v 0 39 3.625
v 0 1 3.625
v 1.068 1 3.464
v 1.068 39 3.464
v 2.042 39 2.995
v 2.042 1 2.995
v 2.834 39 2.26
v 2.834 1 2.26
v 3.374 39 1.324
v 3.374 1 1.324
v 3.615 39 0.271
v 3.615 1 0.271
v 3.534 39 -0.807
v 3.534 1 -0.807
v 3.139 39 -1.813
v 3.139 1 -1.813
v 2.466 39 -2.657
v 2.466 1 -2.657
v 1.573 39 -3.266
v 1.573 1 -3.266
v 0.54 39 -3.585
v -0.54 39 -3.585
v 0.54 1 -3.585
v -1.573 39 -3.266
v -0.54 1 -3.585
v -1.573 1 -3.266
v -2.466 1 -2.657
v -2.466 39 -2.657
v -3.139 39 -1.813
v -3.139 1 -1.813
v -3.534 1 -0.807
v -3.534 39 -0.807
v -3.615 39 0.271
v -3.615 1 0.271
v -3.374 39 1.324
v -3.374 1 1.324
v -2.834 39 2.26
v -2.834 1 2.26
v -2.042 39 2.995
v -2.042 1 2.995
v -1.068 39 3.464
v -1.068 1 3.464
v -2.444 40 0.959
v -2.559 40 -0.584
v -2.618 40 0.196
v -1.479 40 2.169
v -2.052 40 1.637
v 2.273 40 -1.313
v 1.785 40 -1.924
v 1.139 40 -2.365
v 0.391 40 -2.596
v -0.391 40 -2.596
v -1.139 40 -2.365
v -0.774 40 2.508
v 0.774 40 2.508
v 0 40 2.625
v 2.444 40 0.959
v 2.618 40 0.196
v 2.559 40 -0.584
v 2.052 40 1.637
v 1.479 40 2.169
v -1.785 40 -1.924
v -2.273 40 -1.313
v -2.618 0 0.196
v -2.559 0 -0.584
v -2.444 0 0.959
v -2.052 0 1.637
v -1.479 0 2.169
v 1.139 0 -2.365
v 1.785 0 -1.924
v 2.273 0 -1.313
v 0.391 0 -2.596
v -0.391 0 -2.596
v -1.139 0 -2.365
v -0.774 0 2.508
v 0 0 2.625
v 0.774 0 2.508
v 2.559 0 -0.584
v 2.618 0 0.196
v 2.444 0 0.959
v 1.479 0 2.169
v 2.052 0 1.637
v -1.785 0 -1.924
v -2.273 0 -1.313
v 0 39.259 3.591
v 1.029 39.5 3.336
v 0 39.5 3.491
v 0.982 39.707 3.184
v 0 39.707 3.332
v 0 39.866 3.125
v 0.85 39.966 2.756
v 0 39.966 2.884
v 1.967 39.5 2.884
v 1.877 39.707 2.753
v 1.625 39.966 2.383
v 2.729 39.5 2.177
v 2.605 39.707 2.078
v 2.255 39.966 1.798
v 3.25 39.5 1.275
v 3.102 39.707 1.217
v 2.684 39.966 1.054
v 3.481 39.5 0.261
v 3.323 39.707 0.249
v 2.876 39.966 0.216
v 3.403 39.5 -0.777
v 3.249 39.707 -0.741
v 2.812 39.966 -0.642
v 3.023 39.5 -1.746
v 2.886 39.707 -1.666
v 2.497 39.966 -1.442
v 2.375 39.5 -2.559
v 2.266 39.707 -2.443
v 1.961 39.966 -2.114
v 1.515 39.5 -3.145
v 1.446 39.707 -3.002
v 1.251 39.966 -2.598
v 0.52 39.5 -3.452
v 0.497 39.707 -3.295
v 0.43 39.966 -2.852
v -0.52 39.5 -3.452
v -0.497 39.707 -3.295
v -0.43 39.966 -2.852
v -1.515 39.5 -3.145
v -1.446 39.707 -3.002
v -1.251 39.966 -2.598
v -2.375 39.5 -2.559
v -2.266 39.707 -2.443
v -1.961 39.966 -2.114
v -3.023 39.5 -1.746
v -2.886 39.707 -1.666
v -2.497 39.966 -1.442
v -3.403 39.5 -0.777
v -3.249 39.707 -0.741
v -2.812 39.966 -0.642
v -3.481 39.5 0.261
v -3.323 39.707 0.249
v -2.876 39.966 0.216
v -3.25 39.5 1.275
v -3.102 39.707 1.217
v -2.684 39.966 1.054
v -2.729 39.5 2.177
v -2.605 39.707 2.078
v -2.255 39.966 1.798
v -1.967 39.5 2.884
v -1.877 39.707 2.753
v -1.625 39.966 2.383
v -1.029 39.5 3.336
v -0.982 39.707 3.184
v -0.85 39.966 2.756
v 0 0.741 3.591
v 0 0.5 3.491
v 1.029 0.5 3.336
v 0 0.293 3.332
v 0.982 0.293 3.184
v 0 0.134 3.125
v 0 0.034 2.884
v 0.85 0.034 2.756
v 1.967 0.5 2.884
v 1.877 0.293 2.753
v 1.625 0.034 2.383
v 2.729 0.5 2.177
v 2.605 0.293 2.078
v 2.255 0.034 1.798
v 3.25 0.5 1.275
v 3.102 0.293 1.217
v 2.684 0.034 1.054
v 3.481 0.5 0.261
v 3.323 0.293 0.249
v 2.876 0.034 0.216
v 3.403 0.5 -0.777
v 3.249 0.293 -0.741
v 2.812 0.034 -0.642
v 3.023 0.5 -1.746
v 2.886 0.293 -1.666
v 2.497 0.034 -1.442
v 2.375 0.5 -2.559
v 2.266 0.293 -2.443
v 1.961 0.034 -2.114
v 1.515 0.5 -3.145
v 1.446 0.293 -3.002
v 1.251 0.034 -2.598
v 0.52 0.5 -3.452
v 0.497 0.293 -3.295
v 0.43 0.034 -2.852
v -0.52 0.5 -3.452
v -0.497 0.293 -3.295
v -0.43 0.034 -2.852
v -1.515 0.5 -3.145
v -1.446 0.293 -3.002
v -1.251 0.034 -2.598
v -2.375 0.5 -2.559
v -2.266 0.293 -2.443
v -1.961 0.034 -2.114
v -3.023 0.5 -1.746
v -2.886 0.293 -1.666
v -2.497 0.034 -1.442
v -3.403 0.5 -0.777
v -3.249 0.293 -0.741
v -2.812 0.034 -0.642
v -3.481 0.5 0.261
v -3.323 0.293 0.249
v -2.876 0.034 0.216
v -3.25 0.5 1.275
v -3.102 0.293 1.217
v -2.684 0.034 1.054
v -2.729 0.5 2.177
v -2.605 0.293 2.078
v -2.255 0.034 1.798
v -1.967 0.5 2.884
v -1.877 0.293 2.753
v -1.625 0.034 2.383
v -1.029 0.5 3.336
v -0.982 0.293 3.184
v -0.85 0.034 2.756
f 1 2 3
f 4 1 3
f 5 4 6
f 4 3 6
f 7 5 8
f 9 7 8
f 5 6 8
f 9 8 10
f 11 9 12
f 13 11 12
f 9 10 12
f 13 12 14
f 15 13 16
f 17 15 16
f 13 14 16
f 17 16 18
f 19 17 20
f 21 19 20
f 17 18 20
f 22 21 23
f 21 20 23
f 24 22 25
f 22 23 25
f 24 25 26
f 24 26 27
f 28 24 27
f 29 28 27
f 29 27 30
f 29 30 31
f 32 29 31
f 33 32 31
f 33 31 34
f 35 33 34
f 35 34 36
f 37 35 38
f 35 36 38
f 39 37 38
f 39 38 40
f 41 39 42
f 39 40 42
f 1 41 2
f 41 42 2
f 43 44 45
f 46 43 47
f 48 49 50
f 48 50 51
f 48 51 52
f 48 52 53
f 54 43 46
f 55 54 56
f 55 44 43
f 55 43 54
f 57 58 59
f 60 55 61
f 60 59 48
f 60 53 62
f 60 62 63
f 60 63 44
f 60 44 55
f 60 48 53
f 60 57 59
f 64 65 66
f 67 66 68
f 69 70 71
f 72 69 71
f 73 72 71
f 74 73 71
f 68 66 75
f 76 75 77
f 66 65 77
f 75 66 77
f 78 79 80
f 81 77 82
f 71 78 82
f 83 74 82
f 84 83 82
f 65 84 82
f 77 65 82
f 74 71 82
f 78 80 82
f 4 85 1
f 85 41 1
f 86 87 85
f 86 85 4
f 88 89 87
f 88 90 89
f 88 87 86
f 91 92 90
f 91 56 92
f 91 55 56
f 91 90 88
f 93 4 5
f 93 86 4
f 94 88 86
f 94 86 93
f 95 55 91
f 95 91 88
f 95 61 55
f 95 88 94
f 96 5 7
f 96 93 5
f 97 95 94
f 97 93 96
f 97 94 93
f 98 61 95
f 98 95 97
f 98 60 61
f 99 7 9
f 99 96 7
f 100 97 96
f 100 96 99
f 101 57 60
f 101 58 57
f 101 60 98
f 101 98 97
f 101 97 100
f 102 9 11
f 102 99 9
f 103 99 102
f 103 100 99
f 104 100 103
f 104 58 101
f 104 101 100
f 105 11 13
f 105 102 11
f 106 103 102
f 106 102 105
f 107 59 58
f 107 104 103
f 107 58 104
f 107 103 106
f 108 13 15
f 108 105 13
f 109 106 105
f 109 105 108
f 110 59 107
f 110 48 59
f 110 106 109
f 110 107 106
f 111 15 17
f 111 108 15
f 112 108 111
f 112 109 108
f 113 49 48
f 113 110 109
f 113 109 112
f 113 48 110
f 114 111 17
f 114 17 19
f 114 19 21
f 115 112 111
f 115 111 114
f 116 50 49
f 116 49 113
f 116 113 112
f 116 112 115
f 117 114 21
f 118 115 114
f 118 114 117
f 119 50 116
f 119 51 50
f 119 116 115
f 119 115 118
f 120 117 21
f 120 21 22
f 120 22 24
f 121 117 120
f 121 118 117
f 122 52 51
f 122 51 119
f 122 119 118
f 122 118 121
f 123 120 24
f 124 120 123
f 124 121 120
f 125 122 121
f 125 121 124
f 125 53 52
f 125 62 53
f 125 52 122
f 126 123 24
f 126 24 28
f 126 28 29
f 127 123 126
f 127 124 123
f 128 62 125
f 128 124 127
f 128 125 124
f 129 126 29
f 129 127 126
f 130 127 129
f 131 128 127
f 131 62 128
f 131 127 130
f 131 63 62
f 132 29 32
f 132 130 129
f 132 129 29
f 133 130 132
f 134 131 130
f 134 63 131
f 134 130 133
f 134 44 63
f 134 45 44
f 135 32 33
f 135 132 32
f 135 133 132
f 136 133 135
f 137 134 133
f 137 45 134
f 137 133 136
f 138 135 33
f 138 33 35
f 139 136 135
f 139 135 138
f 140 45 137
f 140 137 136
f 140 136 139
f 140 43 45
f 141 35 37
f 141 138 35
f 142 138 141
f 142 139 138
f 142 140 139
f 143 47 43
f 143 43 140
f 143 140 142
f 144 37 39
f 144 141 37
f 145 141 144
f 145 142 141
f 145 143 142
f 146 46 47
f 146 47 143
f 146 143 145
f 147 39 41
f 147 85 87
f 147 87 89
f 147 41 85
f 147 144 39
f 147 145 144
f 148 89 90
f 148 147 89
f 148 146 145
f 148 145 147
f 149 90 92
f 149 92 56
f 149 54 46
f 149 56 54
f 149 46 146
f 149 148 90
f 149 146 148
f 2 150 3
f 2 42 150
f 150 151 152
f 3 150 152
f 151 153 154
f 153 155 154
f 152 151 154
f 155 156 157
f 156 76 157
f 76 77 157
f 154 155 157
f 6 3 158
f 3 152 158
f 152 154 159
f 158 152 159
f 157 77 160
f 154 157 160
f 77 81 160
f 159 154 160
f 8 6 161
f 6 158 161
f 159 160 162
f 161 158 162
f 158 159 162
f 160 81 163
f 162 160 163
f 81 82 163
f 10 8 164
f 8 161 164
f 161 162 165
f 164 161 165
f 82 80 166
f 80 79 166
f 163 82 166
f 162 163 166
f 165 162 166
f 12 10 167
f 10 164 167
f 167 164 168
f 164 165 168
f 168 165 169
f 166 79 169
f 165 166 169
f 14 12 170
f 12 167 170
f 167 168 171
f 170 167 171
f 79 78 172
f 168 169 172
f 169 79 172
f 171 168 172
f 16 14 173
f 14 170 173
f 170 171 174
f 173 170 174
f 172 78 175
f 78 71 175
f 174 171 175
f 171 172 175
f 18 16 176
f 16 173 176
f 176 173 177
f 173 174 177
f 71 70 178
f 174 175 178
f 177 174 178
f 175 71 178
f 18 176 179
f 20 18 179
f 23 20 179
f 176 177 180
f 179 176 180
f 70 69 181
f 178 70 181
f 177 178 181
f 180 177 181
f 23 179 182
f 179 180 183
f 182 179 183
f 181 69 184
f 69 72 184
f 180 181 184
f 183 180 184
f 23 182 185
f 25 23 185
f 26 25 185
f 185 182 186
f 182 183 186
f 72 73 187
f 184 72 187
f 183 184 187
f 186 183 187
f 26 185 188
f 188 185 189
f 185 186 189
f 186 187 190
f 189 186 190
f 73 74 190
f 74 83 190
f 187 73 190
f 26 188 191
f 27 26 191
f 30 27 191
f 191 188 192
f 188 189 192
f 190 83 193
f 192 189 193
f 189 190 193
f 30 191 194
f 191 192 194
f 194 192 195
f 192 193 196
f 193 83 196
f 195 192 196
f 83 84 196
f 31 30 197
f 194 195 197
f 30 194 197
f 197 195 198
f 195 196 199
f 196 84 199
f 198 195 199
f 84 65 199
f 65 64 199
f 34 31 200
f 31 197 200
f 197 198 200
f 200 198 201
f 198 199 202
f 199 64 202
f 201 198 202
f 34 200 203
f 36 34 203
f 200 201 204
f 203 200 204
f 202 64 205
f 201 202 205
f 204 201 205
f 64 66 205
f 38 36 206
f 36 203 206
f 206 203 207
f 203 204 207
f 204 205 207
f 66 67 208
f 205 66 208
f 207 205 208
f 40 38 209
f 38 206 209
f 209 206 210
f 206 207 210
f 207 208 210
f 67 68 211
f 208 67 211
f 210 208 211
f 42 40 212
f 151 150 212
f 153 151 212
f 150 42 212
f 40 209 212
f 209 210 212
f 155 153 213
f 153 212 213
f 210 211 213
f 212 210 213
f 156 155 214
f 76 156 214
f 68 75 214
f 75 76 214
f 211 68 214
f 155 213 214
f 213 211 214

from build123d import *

# Parameters (mm, degrees)
ESQUISSE1_R        = 3.625
BOSS_EXTRU_1_DEPTH = 40
CONG_1_R           = 1
CONG_2_R           = 1


with BuildPart() as part:
    # Esquisse1 → Boss.-Extru.1 (new body)
    with BuildSketch(Plane(origin=(0, 0, 0), x_dir=(1, 0, 0), z_dir=(0, 1, 0))):
        with Locations(Location((0, 0, 0), (0, 0, 270))):
            Circle(ESQUISSE1_R)
    extrude(amount=BOSS_EXTRU_1_DEPTH)

    # Congé1
    cong_1_edges = [part.edges().sort_by_distance(p)[0] for p in [
        (0, 40, -3.625),
    ]]
    fillet(cong_1_edges, radius=CONG_1_R)

    # Congé2
    cong_2_edges = [part.edges().sort_by_distance(p)[0] for p in [
        (0, 0, -3.625),
    ]]
    fillet(cong_2_edges, radius=CONG_2_R)


solid = part.part
